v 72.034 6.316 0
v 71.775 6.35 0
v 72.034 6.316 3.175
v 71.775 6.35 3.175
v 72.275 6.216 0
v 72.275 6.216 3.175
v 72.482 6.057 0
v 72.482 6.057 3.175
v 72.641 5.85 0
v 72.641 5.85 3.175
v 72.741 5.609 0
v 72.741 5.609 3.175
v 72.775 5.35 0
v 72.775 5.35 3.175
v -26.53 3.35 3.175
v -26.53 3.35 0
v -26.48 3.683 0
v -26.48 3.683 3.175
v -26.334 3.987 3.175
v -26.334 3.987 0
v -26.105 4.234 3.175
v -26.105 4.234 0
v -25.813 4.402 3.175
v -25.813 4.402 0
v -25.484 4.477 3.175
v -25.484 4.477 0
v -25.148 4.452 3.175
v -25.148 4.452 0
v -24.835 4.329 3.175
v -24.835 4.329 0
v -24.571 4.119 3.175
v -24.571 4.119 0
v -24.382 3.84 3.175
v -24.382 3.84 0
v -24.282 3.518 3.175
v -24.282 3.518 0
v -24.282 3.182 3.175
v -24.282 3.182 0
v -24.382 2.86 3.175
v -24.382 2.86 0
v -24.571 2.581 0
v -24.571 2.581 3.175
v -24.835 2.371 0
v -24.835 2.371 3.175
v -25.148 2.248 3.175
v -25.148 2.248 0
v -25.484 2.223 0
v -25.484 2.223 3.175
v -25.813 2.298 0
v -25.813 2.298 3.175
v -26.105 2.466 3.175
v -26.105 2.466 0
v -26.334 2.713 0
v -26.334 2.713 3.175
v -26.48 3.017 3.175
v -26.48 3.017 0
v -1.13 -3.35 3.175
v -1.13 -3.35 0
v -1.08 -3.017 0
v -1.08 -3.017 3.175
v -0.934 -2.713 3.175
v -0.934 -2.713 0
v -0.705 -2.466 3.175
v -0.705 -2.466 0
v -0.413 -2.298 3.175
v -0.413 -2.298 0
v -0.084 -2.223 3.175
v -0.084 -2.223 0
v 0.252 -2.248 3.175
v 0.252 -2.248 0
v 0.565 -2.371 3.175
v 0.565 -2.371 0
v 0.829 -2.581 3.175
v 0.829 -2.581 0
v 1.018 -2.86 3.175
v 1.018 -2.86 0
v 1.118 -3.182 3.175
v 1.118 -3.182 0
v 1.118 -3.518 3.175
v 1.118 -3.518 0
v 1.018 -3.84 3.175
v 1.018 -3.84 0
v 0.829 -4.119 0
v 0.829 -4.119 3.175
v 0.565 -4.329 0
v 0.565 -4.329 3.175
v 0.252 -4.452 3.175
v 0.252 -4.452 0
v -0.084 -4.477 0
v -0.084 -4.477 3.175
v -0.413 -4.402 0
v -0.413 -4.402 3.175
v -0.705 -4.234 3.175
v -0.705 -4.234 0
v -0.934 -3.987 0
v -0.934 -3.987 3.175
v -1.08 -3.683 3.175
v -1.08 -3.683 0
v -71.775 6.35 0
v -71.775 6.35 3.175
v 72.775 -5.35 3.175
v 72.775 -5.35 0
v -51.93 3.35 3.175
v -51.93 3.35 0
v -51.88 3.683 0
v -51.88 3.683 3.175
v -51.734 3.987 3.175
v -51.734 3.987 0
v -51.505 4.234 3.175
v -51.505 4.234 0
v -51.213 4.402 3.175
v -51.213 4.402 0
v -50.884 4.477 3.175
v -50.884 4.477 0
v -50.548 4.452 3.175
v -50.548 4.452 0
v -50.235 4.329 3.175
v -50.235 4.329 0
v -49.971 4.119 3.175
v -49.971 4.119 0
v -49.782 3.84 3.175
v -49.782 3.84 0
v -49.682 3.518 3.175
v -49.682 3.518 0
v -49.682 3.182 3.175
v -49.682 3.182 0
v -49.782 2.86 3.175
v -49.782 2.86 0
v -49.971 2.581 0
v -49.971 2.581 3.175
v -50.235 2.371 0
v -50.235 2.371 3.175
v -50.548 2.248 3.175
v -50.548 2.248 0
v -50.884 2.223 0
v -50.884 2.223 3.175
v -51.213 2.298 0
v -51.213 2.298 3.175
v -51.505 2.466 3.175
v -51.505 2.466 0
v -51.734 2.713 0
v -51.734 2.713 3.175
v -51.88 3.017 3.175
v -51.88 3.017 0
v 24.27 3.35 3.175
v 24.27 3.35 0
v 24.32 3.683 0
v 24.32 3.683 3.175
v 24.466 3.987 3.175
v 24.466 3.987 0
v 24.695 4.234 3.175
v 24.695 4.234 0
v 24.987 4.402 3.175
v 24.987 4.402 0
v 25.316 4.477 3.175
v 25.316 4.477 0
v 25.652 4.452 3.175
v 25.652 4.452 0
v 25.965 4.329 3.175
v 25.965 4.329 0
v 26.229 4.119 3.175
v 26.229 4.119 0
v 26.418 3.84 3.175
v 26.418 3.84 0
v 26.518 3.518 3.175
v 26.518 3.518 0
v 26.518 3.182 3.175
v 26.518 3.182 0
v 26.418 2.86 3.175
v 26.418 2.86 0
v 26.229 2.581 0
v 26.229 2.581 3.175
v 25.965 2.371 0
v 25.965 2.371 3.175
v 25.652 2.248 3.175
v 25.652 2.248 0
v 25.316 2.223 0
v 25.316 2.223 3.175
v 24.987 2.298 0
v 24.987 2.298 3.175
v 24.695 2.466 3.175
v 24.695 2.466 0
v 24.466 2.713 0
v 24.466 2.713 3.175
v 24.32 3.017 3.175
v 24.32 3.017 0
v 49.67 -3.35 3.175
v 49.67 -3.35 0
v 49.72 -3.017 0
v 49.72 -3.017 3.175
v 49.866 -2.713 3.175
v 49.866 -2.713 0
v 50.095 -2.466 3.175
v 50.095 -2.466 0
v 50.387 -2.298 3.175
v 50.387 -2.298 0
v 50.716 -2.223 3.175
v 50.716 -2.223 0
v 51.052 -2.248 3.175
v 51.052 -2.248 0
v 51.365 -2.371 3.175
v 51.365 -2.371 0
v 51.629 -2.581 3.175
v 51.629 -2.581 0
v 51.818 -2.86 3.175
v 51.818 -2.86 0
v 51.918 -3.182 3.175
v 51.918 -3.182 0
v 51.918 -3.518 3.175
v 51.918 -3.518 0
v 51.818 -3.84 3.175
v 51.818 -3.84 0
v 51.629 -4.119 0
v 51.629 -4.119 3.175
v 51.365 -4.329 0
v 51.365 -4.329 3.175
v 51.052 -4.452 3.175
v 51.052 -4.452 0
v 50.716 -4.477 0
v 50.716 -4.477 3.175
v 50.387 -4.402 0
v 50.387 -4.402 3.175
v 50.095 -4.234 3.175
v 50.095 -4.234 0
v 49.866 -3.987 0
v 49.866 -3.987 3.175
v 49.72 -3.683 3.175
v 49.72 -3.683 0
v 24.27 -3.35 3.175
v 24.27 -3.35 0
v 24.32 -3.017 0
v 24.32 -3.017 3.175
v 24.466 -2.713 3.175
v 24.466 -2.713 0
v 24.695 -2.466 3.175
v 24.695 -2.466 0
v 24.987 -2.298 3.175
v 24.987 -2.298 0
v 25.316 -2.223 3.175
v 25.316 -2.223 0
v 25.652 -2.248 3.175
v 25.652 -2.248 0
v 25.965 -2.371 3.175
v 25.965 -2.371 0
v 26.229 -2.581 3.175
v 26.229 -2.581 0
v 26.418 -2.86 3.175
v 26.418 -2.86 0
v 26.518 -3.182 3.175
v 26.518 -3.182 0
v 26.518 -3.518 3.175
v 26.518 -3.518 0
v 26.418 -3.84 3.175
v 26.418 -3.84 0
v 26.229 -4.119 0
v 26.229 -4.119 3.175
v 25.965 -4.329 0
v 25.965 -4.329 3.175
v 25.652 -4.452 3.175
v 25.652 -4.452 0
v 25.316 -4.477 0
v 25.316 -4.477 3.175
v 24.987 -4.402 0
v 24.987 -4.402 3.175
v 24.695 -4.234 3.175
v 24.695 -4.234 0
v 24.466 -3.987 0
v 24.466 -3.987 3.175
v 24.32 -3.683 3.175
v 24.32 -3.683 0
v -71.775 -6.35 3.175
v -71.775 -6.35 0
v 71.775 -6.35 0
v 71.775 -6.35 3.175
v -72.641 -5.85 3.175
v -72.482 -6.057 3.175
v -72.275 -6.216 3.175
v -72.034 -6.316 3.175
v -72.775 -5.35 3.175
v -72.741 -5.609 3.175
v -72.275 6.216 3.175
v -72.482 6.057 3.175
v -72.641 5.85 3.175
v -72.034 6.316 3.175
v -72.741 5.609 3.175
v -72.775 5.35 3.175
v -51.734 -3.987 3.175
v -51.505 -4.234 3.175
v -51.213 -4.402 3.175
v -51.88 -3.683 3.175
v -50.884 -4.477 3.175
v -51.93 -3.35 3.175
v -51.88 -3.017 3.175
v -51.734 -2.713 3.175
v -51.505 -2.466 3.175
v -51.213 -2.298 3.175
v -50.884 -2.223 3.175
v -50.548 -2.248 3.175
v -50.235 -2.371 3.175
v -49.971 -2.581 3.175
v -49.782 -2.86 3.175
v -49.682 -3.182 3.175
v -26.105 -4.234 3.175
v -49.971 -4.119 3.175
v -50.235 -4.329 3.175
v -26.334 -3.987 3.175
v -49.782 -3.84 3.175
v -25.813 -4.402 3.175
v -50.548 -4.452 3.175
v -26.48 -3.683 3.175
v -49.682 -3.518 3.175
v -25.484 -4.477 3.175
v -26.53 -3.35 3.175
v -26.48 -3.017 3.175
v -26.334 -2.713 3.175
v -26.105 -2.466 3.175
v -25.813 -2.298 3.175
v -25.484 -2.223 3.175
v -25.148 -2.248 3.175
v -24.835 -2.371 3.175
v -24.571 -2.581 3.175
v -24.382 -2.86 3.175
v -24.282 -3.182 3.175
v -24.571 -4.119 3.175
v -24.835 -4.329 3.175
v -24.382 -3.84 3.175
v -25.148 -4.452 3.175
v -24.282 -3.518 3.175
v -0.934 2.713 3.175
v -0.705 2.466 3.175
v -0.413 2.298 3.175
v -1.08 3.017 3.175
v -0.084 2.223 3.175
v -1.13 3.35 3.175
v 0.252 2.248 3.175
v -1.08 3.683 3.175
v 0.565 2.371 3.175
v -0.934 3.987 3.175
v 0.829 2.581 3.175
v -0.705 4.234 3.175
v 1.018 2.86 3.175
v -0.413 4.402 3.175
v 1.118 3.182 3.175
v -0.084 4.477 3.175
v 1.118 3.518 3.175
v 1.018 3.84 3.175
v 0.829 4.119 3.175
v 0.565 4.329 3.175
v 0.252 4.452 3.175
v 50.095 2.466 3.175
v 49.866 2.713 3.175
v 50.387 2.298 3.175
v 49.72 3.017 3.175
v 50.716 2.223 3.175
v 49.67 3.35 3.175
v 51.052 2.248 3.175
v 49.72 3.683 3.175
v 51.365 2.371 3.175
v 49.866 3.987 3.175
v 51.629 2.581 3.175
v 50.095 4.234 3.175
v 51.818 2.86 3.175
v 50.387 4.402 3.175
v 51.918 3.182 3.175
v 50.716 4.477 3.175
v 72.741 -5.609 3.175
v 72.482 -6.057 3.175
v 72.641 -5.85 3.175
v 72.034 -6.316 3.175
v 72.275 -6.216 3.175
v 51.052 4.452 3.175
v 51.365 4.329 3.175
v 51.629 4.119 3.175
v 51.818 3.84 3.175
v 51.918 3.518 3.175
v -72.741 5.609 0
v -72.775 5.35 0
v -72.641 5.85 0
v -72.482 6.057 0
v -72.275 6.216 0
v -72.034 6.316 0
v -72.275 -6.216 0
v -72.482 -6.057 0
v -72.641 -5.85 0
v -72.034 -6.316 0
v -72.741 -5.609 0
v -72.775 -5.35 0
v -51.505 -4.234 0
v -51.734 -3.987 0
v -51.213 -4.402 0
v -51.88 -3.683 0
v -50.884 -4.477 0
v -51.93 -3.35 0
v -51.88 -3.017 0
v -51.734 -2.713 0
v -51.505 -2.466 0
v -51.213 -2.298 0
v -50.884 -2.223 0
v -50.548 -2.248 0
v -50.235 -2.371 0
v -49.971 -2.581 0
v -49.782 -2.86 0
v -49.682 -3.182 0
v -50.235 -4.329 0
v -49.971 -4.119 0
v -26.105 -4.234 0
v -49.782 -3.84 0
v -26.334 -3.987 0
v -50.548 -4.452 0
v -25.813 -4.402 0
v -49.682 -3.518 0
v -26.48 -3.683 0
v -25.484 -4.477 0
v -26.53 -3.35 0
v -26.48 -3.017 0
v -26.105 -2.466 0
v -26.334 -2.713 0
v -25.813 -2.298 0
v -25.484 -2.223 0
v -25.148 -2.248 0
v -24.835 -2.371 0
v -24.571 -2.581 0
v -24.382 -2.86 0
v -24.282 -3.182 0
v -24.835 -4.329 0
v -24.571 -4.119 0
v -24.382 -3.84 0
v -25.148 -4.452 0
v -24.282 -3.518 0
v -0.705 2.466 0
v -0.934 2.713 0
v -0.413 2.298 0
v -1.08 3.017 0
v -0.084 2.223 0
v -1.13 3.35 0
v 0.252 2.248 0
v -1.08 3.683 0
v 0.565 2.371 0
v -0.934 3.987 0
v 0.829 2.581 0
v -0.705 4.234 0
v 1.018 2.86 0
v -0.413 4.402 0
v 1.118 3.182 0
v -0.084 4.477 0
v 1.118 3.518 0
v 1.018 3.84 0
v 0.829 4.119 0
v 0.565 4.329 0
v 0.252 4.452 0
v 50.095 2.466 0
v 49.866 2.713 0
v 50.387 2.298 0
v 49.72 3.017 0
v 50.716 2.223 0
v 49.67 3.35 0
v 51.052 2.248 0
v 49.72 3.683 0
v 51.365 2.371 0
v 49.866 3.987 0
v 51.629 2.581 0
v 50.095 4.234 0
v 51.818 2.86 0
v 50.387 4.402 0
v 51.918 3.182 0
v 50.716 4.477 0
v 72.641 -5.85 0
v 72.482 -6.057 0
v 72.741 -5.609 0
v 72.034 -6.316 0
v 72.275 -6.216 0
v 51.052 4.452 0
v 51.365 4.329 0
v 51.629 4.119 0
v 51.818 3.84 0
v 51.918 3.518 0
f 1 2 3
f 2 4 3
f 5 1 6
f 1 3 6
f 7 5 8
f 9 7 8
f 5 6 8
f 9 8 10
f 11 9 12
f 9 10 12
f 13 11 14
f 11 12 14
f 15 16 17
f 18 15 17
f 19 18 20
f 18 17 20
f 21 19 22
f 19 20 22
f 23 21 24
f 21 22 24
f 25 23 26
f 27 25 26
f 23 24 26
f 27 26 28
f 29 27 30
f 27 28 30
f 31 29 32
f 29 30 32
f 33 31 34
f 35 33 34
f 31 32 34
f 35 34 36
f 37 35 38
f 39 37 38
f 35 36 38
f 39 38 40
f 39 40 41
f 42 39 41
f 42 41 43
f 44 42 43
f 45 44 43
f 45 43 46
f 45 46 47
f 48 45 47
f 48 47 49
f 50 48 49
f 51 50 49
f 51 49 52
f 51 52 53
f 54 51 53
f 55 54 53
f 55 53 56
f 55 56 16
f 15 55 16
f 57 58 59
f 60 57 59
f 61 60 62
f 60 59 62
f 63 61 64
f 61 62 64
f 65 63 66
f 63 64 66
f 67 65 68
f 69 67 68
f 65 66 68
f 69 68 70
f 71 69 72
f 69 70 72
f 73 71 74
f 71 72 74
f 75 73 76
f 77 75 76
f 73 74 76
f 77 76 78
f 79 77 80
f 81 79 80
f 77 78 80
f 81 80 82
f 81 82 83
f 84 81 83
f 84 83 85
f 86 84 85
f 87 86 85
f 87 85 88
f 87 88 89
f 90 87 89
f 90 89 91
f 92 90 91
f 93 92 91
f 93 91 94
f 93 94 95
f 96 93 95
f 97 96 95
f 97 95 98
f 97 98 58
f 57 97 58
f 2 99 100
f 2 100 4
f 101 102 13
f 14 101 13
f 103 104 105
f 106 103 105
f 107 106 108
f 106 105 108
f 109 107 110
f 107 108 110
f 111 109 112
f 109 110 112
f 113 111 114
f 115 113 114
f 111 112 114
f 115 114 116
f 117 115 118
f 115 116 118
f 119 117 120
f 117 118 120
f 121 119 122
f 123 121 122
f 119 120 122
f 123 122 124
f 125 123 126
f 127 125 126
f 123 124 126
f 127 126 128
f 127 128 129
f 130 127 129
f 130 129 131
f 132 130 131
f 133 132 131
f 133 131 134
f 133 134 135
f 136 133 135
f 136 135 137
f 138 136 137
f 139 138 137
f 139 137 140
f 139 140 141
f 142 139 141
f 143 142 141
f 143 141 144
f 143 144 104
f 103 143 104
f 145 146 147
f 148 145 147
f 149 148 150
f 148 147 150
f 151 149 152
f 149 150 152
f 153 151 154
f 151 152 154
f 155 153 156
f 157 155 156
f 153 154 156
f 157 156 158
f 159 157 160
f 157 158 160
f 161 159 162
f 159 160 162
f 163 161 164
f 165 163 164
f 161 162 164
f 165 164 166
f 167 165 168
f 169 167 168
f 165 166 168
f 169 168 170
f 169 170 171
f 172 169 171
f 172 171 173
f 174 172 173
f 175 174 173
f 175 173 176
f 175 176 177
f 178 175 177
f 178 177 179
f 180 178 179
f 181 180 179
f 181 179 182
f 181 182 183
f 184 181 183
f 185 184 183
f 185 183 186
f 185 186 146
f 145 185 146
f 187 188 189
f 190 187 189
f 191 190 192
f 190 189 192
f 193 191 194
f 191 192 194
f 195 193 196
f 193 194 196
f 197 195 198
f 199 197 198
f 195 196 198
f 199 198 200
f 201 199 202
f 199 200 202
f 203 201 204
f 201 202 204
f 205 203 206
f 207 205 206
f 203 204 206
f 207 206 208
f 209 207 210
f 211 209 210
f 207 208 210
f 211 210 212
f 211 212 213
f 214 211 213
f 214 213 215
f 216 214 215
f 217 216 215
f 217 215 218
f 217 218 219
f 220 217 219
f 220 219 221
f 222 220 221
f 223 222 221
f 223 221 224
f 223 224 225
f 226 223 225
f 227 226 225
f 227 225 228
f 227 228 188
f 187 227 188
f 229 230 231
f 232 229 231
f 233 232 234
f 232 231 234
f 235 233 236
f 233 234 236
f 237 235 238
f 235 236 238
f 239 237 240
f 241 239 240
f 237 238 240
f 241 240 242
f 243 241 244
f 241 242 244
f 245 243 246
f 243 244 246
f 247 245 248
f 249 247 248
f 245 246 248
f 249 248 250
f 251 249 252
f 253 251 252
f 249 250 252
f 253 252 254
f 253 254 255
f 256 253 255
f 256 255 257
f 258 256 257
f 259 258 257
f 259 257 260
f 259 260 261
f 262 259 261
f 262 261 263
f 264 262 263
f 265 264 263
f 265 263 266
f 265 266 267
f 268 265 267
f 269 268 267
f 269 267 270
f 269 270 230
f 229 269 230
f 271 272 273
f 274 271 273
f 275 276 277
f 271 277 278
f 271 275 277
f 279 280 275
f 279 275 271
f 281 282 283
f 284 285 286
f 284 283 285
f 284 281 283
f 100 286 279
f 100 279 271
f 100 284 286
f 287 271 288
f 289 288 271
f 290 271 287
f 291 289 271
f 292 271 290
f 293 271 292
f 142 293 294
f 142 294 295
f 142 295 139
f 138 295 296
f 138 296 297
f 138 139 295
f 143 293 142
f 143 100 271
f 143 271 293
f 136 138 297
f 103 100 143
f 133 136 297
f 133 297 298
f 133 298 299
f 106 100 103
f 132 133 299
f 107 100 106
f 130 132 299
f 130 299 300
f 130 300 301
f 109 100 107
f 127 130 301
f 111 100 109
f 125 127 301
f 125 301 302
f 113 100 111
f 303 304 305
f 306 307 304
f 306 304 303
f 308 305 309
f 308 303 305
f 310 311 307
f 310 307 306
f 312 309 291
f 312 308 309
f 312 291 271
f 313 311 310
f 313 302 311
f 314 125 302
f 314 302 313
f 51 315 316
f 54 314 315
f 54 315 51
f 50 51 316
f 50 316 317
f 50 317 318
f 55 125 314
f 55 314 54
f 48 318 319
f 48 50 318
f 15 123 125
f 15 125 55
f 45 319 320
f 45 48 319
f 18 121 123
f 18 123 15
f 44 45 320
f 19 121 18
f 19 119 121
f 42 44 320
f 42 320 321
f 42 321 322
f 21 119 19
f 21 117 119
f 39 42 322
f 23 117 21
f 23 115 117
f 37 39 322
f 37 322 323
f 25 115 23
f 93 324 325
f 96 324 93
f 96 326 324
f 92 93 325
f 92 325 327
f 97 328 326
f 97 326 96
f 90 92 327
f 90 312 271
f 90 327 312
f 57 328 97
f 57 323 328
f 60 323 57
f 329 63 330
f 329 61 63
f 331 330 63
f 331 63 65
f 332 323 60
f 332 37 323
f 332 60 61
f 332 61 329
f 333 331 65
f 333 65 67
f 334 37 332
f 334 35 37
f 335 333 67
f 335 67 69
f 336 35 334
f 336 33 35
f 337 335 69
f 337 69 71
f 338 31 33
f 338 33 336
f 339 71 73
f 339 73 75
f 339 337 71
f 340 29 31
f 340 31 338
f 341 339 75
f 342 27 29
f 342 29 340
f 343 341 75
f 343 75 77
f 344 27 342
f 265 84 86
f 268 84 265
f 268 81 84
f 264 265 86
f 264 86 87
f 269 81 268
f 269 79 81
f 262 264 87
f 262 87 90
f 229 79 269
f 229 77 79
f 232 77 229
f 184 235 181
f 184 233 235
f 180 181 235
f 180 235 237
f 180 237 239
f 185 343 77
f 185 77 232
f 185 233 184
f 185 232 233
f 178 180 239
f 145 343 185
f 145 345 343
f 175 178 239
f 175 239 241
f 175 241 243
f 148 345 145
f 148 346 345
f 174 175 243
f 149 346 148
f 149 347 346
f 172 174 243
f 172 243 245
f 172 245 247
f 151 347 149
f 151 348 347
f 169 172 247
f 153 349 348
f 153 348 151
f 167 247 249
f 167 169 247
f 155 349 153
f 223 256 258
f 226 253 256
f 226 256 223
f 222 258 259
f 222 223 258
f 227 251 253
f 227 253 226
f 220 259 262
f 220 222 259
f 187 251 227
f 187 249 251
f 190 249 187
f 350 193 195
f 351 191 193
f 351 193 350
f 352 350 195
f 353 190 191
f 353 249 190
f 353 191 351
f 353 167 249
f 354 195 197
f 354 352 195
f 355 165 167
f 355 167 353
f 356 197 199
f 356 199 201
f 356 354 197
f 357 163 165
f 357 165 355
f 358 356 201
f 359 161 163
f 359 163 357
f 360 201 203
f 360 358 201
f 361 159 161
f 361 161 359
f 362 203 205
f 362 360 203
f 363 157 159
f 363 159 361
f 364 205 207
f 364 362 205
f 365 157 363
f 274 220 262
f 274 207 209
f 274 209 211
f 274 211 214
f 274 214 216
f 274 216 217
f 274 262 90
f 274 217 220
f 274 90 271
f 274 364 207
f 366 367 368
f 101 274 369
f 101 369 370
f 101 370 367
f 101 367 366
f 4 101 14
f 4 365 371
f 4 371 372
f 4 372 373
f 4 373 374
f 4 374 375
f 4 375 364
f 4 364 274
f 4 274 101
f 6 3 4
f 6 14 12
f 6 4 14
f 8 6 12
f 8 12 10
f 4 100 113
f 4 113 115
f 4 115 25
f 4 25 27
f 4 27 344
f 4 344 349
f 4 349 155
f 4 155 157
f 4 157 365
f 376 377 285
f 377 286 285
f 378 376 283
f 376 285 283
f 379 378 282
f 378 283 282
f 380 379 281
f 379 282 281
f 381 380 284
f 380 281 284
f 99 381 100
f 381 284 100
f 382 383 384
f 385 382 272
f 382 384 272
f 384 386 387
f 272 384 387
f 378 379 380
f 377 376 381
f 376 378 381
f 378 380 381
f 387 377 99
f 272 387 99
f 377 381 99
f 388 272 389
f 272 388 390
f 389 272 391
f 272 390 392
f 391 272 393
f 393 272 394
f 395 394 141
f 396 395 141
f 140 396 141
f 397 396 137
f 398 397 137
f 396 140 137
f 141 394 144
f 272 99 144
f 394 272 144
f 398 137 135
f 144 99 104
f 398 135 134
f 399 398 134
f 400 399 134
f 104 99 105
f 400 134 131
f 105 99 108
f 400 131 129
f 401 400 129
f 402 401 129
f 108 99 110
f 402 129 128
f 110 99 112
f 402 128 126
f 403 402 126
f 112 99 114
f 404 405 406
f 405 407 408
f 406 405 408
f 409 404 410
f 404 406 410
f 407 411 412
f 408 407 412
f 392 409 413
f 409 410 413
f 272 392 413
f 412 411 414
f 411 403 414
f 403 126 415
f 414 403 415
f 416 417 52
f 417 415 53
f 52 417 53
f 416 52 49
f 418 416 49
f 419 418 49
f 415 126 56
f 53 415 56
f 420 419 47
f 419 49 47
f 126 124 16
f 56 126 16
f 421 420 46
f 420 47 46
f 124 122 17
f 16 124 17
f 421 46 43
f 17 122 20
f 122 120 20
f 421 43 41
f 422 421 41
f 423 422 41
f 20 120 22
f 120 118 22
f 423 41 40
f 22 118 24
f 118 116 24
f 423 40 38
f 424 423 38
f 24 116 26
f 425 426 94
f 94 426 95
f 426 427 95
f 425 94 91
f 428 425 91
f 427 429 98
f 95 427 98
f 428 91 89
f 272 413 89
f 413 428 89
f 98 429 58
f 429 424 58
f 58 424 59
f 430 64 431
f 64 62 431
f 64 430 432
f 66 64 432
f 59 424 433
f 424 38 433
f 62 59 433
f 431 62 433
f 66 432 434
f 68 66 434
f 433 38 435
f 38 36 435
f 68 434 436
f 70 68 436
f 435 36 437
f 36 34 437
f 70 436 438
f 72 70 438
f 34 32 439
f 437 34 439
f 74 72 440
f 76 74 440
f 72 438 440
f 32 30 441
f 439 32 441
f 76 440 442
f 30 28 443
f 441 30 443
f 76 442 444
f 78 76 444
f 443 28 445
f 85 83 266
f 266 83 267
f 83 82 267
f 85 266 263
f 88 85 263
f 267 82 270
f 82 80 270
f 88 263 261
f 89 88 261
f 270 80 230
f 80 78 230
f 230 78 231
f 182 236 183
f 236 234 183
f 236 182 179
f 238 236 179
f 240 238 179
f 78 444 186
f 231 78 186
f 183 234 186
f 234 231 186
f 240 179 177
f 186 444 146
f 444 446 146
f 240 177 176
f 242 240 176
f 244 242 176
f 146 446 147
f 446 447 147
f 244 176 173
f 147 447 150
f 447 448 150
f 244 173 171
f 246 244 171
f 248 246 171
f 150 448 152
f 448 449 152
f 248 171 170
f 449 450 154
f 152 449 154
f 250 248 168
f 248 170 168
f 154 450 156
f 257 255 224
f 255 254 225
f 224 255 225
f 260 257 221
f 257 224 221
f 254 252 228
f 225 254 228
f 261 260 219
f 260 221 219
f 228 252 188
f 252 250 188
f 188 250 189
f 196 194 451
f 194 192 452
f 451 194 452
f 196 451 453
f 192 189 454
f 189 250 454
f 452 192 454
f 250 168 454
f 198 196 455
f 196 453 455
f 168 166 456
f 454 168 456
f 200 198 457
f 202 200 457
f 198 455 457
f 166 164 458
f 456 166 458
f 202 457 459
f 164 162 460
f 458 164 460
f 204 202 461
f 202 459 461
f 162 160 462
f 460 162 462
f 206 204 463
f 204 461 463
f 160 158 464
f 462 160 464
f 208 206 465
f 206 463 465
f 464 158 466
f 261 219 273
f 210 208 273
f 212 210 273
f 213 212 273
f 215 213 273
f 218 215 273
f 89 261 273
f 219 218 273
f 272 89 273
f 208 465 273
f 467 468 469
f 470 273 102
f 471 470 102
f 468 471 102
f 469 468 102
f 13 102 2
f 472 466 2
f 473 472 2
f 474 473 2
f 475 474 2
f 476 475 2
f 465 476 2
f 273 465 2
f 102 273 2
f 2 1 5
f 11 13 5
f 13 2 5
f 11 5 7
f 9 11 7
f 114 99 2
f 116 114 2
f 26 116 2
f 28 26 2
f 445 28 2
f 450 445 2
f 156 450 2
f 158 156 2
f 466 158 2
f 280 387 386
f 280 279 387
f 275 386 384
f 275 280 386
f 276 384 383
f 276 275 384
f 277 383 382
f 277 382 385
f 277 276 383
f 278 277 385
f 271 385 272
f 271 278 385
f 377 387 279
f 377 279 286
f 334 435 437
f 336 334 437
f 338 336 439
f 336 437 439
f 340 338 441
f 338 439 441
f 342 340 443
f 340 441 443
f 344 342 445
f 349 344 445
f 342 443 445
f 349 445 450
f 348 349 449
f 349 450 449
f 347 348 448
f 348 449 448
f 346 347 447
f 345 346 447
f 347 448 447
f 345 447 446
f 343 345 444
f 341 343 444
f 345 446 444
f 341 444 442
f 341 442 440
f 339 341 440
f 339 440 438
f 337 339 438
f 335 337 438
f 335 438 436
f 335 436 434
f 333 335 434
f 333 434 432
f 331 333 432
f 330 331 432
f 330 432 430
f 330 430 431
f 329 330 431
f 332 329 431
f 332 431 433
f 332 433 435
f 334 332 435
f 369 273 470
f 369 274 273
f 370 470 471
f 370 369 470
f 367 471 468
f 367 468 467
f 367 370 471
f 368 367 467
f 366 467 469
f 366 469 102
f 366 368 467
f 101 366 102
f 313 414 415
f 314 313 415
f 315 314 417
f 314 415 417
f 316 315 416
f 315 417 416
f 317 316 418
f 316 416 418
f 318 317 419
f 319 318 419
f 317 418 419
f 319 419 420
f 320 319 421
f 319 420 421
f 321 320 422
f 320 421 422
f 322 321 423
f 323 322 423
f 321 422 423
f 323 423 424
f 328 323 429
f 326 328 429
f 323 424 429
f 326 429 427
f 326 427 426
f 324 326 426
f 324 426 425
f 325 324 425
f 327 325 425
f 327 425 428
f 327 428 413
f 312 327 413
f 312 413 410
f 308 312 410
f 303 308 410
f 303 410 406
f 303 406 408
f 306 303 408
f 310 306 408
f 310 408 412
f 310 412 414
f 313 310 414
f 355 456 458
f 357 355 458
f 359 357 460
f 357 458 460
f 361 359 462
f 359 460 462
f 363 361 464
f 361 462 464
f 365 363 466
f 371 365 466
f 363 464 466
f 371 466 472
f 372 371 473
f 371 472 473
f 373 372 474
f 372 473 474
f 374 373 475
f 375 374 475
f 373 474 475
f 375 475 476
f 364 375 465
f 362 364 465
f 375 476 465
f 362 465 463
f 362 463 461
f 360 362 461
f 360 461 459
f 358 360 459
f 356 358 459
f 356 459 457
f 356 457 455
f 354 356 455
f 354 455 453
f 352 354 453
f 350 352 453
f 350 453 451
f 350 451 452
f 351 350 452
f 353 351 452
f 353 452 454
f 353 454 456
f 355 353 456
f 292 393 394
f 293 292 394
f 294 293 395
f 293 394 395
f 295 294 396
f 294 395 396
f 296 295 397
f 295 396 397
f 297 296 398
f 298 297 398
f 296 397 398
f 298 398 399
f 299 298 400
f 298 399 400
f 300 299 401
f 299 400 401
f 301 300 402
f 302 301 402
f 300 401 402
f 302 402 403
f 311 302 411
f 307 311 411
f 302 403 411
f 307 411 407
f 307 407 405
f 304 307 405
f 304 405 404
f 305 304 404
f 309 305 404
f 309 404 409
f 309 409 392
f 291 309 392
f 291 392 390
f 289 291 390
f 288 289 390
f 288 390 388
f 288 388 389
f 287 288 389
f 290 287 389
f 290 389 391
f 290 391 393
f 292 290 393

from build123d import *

# Parameters (mm, degrees)
SKETCH1_W             = 145.55
SKETCH1_H             = 12.7
BOSS_EXTRUDE1_DEPTH   = 3.175
F_4_40_TAPPED_HOLE1_D = 2.2606
LPATTERN1_COUNT       = 5
LPATTERN1_PITCH       = 25.4
FILLET1_R             = 1


with BuildPart() as part:
    # Sketch1 → Boss-Extrude1 (new body)
    with BuildSketch(Plane.XY):
        Rectangle(SKETCH1_W, SKETCH1_H)
    extrude(amount=BOSS_EXTRUDE1_DEPTH)

    # #4-40 Tapped Hole1 (through all)
    with Locations(Plane(origin=(-50.8, 3.35, 3.175), x_dir=(1, 0, 0), z_dir=(0, 0, 1))):
        with Locations((0, 0), (0, -6.7)):
            f_4_40_tapped_hole1 = Hole(F_4_40_TAPPED_HOLE1_D / 2)

    # LPattern1: #4-40 Tapped Hole1 ×5
    with Locations(*[(i * LPATTERN1_PITCH, 0, 0) for i in range(1, LPATTERN1_COUNT)]):
        add(f_4_40_tapped_hole1, mode=Mode.SUBTRACT)

    # Fillet1
    fillet1_edges = [part.edges().sort_by_distance(p)[0] for p in [
        (-72.775, 6.35, 1.5875),
        (72.775, 6.35, 1.5875),
        (72.775, -6.35, 1.5875),
        (-72.775, -6.35, 1.5875),
    ]]
    fillet(fillet1_edges, radius=FILLET1_R)


solid = part.part
